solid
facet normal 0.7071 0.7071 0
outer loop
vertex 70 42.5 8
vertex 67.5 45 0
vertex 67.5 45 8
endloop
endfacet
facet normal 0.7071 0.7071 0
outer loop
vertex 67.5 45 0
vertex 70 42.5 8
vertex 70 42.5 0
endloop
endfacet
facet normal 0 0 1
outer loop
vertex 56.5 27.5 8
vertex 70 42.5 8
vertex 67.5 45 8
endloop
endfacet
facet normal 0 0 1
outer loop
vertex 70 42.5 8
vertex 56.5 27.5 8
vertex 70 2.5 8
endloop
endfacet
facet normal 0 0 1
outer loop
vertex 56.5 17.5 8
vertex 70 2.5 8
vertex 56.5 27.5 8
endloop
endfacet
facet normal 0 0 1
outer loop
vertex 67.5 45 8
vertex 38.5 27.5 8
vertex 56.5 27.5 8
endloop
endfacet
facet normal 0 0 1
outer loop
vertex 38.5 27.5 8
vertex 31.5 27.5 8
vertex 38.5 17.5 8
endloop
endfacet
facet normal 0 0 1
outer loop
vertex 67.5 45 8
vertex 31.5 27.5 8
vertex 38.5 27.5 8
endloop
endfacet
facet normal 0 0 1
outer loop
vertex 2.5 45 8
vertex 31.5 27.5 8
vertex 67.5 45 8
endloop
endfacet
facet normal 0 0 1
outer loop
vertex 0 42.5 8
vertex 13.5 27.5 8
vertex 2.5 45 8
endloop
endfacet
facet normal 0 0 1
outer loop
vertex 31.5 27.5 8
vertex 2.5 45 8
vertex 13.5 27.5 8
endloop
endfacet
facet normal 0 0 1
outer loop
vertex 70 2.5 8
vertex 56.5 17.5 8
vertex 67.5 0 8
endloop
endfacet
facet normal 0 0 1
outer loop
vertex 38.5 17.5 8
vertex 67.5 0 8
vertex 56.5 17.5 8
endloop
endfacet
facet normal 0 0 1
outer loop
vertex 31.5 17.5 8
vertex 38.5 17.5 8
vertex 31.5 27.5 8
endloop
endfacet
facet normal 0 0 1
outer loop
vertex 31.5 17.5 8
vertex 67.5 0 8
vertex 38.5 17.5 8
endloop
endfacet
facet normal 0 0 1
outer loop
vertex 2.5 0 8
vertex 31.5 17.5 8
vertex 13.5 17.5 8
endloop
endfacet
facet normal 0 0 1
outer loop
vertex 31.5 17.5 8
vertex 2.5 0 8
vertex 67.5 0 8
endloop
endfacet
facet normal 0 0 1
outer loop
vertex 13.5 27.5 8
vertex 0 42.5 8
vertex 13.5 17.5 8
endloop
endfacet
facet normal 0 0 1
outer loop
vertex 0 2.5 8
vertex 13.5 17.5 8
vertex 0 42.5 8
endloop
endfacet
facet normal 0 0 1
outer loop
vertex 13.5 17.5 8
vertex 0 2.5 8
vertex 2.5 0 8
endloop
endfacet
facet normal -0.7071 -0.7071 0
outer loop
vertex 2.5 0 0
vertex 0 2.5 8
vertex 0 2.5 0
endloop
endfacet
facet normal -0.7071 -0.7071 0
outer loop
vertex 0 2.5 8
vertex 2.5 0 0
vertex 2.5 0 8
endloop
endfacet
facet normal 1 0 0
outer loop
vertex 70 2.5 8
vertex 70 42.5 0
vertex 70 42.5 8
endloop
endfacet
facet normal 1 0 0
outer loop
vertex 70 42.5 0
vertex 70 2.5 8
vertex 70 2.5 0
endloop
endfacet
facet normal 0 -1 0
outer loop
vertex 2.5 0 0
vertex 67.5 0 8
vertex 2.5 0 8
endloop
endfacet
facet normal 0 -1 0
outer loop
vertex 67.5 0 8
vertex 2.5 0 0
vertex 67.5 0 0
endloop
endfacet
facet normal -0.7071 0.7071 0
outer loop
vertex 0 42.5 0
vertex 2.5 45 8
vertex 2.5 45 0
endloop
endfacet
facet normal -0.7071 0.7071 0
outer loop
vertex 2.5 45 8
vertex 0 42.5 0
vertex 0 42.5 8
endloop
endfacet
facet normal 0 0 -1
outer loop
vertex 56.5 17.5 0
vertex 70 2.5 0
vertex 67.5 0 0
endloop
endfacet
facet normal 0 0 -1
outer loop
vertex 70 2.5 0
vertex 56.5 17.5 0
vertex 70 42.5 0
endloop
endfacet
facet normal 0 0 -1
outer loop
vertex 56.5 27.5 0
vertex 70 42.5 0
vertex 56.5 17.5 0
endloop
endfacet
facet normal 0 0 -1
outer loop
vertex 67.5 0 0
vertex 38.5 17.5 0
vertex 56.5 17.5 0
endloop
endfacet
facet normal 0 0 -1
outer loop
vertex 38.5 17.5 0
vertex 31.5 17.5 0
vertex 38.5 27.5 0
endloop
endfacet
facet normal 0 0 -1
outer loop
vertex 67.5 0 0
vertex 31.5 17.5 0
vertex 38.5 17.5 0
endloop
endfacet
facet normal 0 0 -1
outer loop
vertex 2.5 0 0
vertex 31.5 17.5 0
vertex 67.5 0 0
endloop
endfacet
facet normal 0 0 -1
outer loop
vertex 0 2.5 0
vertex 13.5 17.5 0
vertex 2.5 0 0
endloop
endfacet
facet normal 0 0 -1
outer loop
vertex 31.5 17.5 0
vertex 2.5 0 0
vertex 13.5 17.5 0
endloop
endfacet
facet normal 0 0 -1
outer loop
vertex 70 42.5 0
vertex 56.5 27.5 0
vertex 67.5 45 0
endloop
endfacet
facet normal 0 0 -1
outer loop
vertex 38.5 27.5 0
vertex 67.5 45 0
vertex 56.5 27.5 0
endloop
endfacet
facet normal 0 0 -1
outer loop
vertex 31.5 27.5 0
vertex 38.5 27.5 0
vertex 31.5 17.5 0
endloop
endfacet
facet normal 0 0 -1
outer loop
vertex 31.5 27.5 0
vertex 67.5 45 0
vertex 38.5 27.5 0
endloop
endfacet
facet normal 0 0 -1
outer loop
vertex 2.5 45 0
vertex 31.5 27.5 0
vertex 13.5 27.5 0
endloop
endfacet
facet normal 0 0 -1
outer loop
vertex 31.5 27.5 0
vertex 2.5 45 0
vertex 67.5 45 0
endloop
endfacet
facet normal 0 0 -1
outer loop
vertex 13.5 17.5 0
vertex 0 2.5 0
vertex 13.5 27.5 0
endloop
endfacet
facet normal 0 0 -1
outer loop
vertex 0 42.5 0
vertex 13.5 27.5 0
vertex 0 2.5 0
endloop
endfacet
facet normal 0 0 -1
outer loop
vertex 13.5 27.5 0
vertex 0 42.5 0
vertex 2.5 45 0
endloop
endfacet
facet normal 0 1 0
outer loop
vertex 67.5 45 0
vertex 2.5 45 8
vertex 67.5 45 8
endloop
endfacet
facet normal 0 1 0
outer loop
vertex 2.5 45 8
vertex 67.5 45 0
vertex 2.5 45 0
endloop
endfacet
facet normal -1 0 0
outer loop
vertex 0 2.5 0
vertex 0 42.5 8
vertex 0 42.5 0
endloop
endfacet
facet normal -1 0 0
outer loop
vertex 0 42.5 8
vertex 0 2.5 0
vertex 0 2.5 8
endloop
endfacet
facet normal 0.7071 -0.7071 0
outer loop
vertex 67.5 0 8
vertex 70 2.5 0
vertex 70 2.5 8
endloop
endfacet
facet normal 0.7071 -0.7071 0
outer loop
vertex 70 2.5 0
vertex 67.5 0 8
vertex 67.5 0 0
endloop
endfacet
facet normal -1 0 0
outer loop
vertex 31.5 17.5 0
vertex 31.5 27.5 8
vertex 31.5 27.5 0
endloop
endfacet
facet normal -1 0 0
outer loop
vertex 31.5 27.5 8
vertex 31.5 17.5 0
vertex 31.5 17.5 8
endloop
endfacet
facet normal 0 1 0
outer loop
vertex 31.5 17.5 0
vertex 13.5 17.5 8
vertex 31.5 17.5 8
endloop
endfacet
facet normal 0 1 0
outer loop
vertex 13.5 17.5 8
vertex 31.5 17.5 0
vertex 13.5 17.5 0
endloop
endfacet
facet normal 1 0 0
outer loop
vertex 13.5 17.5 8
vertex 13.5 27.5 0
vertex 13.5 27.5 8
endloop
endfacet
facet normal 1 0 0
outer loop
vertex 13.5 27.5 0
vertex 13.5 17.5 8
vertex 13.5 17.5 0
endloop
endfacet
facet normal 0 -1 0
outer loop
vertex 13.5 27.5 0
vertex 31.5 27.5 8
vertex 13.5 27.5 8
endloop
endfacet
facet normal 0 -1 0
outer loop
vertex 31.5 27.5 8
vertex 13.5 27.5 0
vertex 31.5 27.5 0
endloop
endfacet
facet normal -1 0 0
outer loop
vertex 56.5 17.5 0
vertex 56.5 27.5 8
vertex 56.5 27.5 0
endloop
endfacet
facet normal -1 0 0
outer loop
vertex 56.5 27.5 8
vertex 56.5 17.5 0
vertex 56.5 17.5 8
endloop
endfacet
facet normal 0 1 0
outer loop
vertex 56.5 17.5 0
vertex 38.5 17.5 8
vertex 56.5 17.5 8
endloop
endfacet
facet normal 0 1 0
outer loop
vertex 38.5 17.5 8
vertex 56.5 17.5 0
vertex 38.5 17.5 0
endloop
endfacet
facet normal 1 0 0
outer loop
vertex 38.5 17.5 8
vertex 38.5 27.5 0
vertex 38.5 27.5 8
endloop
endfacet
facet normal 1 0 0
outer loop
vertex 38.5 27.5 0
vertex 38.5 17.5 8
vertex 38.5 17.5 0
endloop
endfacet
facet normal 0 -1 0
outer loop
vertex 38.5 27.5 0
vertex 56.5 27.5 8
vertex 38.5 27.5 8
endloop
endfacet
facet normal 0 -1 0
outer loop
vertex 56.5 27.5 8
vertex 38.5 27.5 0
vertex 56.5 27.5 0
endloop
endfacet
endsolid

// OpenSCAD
$fn = 32;

// ----------------------------------------------------------------------
// Windowed plate: 2 voids, 70 x 45 x 8 mm
// ----------------------------------------------------------------------

// --- parameters (mm) ---
plate_l = 70;             // plate length, X
plate_w = 45;             // plate width, Y
plate_t = 8;              // plate thickness, Z
edge_margin = 10;         // wall from the plate edge to any window
windows = 2;              // number of windows in the row
win_l = 18;               // window length
win_w = 10;               // window width
win_pitch = 25;           // window pitch along X
depth_1 = 8;              // depth of void 1 (full thickness = through)
depth_2 = 8;              // depth of void 2 (full thickness = through)
corner_c = 2.5;           // corner chamfer of the plate

profile = [[2.5, 0], [67.5, 0], [70, 2.5], [70, 42.5], [67.5, 45], [2.5, 45], [0, 42.5], [0, 2.5]];  // primary outline, 8 points, counter clockwise
void_1 = [[13.5, 17.5], [31.5, 17.5], [31.5, 27.5], [13.5, 27.5]];  // window 1 of the row, 4 points
void_2 = [[38.5, 17.5], [56.5, 17.5], [56.5, 27.5], [38.5, 27.5]];  // window 2 of the row, 4 points

// --- the one profile operation ---
difference() {
  linear_extrude(height = plate_t) polygon(points = profile);
  translate([0, 0, -1])
    linear_extrude(height = plate_t + 2) polygon(points = void_1);
  translate([0, 0, -1])
    linear_extrude(height = plate_t + 2) polygon(points = void_2);
}
